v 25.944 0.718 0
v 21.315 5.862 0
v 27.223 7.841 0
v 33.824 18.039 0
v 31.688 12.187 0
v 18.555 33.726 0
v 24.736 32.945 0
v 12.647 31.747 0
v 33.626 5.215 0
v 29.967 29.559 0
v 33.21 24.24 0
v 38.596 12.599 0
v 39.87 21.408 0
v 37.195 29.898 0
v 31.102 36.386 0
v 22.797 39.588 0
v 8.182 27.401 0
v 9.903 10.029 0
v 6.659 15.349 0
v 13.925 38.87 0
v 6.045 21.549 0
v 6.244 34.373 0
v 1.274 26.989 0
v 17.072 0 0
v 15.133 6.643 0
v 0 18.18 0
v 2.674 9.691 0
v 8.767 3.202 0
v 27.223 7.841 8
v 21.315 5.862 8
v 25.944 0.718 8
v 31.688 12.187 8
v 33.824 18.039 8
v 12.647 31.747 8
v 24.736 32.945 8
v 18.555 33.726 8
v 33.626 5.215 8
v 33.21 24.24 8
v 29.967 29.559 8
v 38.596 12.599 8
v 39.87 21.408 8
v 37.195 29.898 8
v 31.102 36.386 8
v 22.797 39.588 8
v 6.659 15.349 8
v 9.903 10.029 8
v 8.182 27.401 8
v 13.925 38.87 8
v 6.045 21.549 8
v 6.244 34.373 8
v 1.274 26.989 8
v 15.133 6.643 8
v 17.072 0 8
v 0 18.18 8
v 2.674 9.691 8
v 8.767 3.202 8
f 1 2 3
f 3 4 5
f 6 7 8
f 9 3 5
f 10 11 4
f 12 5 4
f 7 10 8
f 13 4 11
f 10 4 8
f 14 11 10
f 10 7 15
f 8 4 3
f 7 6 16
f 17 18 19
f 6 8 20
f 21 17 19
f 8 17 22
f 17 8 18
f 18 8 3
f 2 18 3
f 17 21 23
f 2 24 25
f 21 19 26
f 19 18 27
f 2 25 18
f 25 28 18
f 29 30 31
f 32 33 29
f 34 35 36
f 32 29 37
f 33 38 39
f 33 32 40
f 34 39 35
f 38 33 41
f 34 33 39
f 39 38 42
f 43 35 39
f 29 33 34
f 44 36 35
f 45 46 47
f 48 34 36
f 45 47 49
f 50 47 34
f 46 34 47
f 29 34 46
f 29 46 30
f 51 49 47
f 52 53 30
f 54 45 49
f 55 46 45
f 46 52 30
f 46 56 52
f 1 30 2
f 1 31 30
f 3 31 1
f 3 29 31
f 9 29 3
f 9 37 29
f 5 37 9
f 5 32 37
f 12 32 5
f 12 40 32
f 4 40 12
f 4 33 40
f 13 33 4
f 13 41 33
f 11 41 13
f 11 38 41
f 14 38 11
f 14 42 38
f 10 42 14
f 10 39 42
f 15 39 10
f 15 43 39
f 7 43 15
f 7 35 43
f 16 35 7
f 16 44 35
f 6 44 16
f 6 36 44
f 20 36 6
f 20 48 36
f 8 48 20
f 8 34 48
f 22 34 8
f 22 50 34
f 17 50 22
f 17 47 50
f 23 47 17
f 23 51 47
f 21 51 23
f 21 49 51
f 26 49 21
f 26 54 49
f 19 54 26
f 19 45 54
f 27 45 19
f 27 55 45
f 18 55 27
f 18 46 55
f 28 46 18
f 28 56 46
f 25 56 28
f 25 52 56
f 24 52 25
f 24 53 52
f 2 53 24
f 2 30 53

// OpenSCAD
$fn = 32;

// ----------------------------------------------------------------------
// Chain sprocket: 14 teeth, 14 mm root radius
// ----------------------------------------------------------------------

// --- parameters (mm) ---
profile_height = 8;       // extrusion height
profile_points = 28;      // points of the closed outline

profile = [[33.824, 18.039], [39.87, 21.408], [33.21, 24.24], [37.195, 29.898], [29.967, 29.559], [31.102, 36.386], [24.736, 32.945], [22.797, 39.588], [18.555, 33.726], [13.925, 38.87], [12.647, 31.747], [6.244, 34.373], [8.182, 27.401], [1.274, 26.989], [6.045, 21.549], [0, 18.18], [6.659, 15.349], [2.674, 9.691], [9.903, 10.029], [8.767, 3.202], [15.133, 6.643], [17.072, 0], [21.315, 5.862], [25.944, 0.718], [27.223, 7.841], [33.626, 5.215], [31.688, 12.187], [38.596, 12.599]];  // single closed polygon, 28 points, counter clockwise

// --- the one profile operation ---
linear_extrude(height = profile_height) polygon(points = profile);
